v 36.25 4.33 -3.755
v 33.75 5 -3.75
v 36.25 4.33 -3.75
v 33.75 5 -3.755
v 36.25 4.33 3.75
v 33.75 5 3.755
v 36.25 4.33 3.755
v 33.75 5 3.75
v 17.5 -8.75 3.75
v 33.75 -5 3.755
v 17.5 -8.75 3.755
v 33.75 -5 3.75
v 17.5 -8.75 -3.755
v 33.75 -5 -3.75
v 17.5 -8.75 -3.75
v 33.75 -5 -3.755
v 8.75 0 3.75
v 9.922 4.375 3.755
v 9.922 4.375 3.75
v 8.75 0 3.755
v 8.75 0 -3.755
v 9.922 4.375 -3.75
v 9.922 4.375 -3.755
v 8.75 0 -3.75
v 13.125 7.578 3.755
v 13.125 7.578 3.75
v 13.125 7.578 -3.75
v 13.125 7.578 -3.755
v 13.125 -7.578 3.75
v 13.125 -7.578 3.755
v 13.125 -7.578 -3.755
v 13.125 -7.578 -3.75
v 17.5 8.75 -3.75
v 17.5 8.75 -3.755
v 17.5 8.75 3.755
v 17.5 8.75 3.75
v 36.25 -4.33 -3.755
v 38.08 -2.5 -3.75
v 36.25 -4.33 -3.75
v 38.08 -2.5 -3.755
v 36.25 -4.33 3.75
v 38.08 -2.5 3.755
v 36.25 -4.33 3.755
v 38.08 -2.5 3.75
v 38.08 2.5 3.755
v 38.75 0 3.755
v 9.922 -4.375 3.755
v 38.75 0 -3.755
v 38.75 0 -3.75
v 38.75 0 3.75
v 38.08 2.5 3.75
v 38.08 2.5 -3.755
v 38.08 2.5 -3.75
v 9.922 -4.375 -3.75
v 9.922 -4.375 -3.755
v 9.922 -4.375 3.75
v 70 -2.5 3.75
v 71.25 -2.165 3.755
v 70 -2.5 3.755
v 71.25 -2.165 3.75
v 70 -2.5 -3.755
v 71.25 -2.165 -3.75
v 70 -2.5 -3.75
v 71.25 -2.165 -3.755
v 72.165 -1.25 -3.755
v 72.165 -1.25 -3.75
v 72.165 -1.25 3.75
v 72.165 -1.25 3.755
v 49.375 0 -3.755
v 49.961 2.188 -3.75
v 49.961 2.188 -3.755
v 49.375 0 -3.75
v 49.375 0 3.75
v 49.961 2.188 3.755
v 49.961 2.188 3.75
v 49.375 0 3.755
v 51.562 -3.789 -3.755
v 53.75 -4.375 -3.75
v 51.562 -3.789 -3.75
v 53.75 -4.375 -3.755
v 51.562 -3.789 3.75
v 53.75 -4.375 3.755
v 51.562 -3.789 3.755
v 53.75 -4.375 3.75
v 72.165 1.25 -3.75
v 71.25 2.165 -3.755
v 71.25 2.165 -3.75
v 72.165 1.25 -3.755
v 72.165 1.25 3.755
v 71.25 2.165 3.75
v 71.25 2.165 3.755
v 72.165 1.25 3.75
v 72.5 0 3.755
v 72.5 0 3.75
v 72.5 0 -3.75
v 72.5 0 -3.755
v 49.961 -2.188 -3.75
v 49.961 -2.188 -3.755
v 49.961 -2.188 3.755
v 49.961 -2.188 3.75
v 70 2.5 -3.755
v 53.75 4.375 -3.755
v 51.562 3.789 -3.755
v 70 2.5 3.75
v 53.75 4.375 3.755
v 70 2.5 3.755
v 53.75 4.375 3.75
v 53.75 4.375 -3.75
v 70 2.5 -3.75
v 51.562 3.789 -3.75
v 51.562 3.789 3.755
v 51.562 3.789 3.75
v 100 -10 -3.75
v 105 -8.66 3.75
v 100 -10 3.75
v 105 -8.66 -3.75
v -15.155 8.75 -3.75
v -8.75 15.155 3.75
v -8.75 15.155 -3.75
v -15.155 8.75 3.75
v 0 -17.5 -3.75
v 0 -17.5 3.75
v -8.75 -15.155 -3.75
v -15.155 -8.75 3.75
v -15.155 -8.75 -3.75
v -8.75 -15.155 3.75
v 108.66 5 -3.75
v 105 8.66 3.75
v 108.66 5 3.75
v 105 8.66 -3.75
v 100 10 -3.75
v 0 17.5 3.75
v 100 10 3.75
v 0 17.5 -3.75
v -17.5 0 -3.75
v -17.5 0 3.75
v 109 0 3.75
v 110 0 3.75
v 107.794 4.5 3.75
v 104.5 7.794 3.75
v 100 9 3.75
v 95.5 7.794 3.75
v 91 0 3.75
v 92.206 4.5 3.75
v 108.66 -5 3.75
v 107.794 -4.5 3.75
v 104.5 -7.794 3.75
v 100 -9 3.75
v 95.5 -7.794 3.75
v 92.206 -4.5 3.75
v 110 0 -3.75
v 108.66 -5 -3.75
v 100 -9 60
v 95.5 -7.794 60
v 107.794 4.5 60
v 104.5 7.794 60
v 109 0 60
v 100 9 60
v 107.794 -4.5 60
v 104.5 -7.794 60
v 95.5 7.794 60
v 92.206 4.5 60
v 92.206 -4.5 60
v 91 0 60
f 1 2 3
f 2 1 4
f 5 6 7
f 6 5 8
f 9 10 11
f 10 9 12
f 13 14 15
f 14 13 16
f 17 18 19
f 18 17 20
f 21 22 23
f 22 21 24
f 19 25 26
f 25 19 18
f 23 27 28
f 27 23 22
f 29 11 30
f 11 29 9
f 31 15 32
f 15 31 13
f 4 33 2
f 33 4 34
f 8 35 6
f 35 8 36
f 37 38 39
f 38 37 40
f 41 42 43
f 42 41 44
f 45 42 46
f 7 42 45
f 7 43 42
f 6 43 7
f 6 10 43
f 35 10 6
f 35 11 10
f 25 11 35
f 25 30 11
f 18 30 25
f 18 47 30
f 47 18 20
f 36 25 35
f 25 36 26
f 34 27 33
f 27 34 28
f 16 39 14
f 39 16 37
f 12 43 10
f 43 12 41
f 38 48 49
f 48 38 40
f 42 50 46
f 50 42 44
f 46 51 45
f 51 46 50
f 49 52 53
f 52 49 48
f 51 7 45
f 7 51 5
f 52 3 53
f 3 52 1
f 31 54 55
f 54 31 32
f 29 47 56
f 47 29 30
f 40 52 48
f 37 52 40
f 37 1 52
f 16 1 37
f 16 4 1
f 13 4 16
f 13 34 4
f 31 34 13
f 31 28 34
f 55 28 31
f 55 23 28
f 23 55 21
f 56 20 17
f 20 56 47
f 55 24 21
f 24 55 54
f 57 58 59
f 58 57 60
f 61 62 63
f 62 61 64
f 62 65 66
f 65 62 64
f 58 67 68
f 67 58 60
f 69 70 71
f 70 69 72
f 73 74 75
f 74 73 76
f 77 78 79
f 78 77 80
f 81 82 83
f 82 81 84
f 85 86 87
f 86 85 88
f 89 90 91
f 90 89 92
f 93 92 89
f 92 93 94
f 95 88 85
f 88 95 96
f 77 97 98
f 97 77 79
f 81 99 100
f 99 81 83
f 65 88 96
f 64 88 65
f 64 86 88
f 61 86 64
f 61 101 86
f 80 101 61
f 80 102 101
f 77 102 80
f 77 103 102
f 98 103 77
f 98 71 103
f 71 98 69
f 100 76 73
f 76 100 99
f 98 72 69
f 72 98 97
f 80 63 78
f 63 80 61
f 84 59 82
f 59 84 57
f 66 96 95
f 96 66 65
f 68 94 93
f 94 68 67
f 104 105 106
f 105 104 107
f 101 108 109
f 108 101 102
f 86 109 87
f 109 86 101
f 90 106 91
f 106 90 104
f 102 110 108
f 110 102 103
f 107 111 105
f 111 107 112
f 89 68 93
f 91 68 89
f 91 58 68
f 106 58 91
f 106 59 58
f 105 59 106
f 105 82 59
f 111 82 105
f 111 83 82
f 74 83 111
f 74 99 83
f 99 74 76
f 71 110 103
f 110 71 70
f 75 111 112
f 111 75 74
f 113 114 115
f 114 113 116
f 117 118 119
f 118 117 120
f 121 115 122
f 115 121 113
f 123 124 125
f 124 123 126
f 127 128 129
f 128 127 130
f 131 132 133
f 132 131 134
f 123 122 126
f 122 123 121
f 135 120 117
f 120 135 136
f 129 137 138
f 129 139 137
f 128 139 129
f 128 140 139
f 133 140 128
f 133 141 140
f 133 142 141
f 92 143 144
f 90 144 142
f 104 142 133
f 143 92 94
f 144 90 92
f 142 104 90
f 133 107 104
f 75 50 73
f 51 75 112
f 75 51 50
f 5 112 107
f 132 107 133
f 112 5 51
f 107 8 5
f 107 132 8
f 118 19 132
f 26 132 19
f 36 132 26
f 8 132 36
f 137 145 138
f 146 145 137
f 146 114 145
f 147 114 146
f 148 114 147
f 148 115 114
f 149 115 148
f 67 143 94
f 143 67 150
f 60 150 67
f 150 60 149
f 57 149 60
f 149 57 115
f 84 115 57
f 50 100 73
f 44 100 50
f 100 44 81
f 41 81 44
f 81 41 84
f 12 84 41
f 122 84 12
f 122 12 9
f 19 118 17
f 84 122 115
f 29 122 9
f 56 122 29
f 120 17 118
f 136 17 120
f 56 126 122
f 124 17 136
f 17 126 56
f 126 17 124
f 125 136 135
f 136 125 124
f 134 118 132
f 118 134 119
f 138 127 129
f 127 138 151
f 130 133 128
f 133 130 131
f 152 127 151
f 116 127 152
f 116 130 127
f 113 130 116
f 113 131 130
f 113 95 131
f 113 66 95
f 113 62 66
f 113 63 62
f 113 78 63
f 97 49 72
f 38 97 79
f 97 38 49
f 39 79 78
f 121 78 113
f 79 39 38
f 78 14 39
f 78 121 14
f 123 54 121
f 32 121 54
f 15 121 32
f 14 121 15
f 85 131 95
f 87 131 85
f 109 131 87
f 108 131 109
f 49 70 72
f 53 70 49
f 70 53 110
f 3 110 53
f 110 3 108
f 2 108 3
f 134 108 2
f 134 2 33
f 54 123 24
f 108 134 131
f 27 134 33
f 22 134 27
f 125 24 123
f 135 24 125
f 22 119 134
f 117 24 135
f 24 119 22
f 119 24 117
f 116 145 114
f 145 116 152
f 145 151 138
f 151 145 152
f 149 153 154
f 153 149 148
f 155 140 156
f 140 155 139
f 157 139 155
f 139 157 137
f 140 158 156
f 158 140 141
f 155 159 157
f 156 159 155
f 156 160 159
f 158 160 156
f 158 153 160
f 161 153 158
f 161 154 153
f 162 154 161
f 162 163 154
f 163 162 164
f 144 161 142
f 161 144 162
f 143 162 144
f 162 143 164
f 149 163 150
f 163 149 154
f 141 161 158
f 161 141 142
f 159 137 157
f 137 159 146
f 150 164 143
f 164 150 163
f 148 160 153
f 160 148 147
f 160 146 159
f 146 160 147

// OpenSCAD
DoCrBase=35;
DoCrTip=20;
HoCr=7.5;

LENoCr=100;	// Lenght of Crank Center to Center Cylinder

NoHol=2;

$fn=12;

Crank();
module Crank (){
	difference(){
		hull(){
			cylinder(h=HoCr,d1=DoCrBase,d2=DoCrBase,center=true);
			translate([LENoCr,0,0]){
				cylinder(h=HoCr,d1=DoCrTip,d2=DoCrTip,center=true);
			}
		}
		Crank_Arm_Cut();
	}
	translate([LENoCr,0,0]){
		cylinder(h=60,d1=DoCrTip-DoCrTip*0.1,d2=DoCrTip-DoCrTip*0.1);
	}
}


#Crank_Arm_Cut();	
module Crank_Arm_Cut(){
	step=LENoCr-DoCrBase/2-DoCrTip/2;
	echo(step);
	translate([DoCrBase/2,0,0]){
		for(i=[0:1:NoHol-1]){
		//for(i=[DoCrBase/2:LENoCr/NoHol:LENoCr]){
			translate([step/NoHol*i,0,0]){
				scale([1,1,1]){	
					//echo(i);
					echo(i);
					echo(LENoCr/NoHol);
					//cylinder(h=HoCr+0.01,d1=DoCrBase/2,d2=DoCrBase/2);
					hull(){
						cylinder(h=HoCr+0.01,d1=(DoCrBase/2)/(i+1),d2=(DoCrBase/2)/(i+1),center=true);
						translate([(LENoCr-DoCrBase/2-DoCrTip/2)/NoHol-20,0,0]){ 
							cylinder(h=HoCr+0.01,d1=(DoCrTip/2)/(i+1),d2=(DoCrTip/2)/(i+1),center=true);
						}
					}
				}
			}
		}
	}
}

//LENoCr-DoCrBase/2-DoCrTip/2
//step/NoHol-DoCrBase/2
